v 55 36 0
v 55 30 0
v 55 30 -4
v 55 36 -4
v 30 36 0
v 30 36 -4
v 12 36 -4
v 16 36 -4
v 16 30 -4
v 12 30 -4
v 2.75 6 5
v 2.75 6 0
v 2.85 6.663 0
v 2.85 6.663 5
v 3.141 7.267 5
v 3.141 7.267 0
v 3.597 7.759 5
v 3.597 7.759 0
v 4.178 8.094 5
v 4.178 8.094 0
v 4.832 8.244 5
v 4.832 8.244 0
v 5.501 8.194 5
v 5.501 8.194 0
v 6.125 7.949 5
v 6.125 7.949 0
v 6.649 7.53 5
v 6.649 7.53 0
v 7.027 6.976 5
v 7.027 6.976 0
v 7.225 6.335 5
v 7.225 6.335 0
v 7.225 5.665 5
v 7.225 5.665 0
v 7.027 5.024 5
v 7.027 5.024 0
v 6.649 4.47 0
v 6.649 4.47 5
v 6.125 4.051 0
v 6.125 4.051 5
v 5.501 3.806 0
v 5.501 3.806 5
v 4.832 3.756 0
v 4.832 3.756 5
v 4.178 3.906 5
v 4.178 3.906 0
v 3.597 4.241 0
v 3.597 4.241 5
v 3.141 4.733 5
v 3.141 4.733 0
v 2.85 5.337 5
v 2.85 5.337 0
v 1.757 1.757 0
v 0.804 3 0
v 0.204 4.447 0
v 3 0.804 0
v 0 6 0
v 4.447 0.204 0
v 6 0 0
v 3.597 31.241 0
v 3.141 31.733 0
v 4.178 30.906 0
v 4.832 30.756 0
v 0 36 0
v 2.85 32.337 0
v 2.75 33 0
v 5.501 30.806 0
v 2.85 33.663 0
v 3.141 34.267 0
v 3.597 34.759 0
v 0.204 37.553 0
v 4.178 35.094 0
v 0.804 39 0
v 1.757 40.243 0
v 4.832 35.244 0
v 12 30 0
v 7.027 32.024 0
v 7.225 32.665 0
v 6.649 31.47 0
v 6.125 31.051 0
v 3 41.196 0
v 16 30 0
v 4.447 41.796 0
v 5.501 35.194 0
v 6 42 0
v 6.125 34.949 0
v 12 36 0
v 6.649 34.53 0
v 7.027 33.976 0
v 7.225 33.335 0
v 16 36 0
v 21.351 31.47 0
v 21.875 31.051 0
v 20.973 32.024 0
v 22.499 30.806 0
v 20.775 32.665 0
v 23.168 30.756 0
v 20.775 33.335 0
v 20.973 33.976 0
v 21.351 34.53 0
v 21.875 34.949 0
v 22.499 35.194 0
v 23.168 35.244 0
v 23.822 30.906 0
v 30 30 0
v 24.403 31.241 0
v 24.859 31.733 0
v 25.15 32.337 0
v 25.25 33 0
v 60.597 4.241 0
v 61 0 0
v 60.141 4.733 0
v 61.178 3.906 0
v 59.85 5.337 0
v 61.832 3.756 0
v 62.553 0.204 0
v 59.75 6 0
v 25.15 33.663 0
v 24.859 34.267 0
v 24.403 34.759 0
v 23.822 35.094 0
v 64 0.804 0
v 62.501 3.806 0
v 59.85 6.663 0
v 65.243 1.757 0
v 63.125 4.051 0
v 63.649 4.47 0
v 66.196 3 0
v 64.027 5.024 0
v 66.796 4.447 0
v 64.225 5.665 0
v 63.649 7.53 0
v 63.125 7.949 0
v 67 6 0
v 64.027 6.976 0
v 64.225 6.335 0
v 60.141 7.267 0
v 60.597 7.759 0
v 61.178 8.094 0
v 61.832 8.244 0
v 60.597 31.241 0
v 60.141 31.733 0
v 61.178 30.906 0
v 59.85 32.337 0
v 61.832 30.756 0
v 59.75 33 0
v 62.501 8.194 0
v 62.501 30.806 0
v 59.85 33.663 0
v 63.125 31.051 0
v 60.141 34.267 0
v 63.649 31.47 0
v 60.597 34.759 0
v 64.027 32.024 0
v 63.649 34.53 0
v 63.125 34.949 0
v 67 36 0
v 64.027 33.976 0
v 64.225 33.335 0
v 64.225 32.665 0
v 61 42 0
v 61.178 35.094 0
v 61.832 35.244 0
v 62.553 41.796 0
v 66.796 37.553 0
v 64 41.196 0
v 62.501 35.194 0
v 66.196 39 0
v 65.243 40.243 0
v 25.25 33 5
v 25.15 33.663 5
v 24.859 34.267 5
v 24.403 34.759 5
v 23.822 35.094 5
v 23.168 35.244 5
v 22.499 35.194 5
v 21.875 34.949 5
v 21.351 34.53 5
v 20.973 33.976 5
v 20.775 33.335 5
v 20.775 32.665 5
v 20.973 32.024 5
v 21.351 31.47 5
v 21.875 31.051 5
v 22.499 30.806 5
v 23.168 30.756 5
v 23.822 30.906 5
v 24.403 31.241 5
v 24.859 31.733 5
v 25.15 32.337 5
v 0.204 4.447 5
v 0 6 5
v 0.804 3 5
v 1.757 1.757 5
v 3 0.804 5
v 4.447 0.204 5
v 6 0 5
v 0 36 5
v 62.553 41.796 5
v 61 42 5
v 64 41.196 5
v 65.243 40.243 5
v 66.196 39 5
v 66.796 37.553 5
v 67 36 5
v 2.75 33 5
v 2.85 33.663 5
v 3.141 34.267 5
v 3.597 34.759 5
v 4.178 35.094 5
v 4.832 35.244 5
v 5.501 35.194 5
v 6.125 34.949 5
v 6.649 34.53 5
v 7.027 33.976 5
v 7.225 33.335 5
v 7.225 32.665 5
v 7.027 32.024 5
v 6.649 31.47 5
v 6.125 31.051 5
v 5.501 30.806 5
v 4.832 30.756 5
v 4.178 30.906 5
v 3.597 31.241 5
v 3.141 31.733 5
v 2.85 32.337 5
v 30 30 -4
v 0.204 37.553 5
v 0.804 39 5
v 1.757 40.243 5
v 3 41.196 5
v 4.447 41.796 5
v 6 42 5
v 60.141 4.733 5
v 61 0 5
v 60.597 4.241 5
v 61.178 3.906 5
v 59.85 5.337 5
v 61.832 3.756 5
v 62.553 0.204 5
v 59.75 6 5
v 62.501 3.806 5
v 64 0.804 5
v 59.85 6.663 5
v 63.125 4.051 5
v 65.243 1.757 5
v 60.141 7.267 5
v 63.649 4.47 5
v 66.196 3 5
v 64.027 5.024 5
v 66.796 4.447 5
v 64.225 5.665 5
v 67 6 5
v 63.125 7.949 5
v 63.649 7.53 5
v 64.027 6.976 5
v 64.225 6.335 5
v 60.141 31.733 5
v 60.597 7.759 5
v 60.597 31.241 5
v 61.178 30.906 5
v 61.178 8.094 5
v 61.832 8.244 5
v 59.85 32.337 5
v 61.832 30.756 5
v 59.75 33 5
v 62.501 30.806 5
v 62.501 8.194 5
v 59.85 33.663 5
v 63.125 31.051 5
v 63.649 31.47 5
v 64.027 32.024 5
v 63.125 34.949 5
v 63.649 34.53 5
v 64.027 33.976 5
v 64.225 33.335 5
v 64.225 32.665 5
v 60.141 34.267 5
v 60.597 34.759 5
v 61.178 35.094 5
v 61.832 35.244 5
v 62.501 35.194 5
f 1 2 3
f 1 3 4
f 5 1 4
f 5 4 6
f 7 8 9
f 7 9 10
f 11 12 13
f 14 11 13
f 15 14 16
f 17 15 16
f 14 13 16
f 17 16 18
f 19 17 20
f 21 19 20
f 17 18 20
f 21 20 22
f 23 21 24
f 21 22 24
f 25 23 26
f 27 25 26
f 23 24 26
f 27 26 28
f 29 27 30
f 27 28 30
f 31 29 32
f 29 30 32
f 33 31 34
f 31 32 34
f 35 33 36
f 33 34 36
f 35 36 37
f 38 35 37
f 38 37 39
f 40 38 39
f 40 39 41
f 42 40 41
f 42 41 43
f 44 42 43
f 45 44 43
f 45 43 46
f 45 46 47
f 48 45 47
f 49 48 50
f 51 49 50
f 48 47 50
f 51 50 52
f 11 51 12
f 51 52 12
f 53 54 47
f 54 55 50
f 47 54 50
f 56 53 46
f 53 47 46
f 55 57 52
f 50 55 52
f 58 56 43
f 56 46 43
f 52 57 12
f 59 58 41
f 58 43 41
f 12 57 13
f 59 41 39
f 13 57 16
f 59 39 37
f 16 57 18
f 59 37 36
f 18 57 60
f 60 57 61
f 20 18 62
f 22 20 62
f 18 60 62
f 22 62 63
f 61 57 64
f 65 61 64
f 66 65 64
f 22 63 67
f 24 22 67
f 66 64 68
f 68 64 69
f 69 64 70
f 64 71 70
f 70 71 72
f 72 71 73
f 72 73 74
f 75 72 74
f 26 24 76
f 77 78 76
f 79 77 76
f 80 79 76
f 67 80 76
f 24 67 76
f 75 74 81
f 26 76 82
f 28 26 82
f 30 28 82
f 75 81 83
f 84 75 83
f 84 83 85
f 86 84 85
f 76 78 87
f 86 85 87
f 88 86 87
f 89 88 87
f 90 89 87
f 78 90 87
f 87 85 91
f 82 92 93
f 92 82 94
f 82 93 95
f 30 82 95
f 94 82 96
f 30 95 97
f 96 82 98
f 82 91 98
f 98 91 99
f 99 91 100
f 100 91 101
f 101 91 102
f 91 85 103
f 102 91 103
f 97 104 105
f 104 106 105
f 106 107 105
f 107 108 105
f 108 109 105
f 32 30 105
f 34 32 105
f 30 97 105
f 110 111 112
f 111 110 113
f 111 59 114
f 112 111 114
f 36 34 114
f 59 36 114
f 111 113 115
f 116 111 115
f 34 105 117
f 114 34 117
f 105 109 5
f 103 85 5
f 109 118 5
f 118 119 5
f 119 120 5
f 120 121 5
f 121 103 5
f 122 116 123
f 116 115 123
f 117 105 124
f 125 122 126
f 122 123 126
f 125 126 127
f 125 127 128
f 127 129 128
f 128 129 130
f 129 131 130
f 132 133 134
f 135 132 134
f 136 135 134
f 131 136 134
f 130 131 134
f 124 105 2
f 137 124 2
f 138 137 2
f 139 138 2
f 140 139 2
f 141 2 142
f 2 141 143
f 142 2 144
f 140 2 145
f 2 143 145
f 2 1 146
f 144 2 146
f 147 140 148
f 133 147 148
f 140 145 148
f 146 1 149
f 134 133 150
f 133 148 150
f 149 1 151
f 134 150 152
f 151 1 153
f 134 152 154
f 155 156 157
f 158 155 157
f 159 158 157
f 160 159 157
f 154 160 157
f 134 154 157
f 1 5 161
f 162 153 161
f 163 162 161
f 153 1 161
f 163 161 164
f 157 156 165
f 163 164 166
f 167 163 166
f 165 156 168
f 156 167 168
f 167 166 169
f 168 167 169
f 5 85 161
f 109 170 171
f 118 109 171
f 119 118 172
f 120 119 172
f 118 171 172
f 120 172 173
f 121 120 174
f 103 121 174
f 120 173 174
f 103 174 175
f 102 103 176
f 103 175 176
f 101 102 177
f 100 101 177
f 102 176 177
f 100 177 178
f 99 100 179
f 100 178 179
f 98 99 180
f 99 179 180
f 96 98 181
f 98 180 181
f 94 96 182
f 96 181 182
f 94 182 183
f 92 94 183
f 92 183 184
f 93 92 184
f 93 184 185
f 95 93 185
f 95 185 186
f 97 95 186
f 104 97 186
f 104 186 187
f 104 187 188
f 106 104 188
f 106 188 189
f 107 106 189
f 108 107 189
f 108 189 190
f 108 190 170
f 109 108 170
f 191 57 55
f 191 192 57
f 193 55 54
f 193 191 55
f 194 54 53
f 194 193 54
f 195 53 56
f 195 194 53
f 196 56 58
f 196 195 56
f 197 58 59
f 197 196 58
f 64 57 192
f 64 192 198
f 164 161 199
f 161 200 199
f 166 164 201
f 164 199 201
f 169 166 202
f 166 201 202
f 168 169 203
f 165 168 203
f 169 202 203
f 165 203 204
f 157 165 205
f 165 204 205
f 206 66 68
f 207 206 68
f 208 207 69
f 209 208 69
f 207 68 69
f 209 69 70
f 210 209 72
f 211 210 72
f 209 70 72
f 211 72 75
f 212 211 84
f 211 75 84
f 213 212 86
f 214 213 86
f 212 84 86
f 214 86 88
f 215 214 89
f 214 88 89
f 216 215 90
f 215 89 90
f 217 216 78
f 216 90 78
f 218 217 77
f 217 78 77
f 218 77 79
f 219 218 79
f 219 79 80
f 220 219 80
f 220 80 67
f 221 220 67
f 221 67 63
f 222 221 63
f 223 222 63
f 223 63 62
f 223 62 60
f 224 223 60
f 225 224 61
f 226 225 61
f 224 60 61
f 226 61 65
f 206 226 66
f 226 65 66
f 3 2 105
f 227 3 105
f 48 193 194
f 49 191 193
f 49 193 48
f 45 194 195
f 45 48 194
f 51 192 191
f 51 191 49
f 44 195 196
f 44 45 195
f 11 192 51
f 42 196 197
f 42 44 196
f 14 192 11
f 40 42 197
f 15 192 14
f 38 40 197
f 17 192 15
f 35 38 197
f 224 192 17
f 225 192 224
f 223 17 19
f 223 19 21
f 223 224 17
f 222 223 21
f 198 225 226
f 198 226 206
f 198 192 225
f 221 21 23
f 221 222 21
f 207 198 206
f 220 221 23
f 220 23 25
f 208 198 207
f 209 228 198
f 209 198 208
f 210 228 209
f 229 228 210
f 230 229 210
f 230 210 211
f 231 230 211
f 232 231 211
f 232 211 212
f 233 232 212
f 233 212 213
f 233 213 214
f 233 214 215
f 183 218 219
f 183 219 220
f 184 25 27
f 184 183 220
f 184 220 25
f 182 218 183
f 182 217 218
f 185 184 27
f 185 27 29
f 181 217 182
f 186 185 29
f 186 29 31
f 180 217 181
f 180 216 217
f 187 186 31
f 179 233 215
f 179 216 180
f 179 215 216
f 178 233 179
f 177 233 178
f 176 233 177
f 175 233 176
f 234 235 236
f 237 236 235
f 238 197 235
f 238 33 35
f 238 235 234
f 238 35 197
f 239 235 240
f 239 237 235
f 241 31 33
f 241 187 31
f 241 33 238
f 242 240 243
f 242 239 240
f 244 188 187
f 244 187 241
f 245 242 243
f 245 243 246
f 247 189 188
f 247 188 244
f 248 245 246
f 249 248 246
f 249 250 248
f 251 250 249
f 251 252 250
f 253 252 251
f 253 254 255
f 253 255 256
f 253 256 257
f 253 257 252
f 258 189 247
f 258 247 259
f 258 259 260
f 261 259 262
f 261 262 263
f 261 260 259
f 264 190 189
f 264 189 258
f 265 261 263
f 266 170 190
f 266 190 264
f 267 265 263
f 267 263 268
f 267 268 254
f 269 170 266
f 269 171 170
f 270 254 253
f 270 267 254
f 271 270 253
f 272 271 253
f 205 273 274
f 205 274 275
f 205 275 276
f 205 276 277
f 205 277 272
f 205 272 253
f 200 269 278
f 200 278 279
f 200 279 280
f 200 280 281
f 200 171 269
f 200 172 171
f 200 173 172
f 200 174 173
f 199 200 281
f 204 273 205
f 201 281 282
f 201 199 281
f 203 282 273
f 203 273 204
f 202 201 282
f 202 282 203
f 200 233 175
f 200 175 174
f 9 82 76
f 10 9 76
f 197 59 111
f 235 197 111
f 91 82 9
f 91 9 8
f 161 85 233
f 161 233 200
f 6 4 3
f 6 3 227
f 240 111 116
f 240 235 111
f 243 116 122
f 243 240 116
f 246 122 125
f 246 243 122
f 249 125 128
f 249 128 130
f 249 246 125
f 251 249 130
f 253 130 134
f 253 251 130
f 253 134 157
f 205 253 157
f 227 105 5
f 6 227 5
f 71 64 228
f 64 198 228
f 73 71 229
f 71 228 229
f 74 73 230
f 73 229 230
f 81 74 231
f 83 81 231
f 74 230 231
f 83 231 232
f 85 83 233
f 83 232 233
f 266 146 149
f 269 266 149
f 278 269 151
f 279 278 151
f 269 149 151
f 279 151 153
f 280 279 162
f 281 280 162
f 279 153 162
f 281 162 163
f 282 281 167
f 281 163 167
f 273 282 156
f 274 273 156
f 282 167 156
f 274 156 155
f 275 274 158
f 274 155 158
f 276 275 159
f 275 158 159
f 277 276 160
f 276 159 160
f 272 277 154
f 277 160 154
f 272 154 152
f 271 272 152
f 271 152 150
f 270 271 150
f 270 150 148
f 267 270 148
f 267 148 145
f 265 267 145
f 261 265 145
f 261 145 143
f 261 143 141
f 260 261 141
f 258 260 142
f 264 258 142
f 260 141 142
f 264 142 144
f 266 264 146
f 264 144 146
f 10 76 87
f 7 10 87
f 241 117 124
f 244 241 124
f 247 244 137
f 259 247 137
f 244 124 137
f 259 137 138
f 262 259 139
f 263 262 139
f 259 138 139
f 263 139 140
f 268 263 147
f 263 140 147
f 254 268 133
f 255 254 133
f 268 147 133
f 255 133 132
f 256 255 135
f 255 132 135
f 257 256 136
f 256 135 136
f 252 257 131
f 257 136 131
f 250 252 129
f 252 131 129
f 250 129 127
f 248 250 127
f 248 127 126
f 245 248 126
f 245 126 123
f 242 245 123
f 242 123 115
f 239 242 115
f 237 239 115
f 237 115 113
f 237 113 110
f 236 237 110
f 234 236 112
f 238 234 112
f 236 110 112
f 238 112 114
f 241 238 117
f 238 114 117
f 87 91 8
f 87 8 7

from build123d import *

# Parameters (mm, degrees)
SKETCH_1_W          = 67
SKETCH_1_H          = 42
EXTRUDE_1_DEPTH     = 5
SKETCH_2_R          = 2.25
CUT_EXTRUDE_1_DEPTH = 5
FILLET_1_R          = 6
SKETCH_4_R          = 2.25
CUT_EXTRUDE_2_DEPTH = 10
SKETCH_3_W          = 4
SKETCH_3_H          = 6
SKETCH_3_W_2        = 25
EXTRUDE_2_DEPTH     = 4


with BuildPart() as part:
    # Эскиз1 → Бобышка-Вытянуть1 (new body)
    with BuildSketch(Plane.XY):
        with Locations((33.5, 21)):
            Rectangle(SKETCH_1_W, SKETCH_1_H)
    extrude(amount=EXTRUDE_1_DEPTH)

    # Эскиз2 → Вырез-Вытянуть1 (cut)
    with BuildSketch(Plane(origin=(0, 0, 0), x_dir=(-1, 0, 0), z_dir=(0, 0, -1))):
        with Locations((-62, 6)):
            Circle(SKETCH_2_R)
        with Locations((-62, 33)):
            Circle(SKETCH_2_R)
        with Locations((-5, 6)):
            Circle(SKETCH_2_R)
        with Locations((-5, 33)):
            Circle(SKETCH_2_R)
    extrude(amount=-CUT_EXTRUDE_1_DEPTH, mode=Mode.SUBTRACT)

    # Скругление1
    fillet_1_edges = [part.edges().sort_by_distance(p)[0] for p in [
        (0, 42, 2.5),
        (67, 42, 2.5),
        (67, 0, 2.5),
        (0, 0, 2.5),
    ]]
    fillet(fillet_1_edges, radius=FILLET_1_R)

    # Эскиз4 → Вырез-Вытянуть2 (cut)
    with BuildSketch(Plane.XY.offset(5)):
        with Locations((23, 33)):
            Circle(SKETCH_4_R)
    extrude(amount=-CUT_EXTRUDE_2_DEPTH, mode=Mode.SUBTRACT)

    # Эскиз3 → Бобышка-Вытянуть2 (add)
    with BuildSketch(Plane(origin=(0, 0, 0), x_dir=(-1, 0, 0), z_dir=(0, 0, -1))):
        with Locations((-14, 33)):
            Rectangle(SKETCH_3_W, SKETCH_3_H)
        with Locations((-42.5, 33)):
            Rectangle(SKETCH_3_W_2, SKETCH_3_H)
    extrude(amount=EXTRUDE_2_DEPTH)


solid = part.part
